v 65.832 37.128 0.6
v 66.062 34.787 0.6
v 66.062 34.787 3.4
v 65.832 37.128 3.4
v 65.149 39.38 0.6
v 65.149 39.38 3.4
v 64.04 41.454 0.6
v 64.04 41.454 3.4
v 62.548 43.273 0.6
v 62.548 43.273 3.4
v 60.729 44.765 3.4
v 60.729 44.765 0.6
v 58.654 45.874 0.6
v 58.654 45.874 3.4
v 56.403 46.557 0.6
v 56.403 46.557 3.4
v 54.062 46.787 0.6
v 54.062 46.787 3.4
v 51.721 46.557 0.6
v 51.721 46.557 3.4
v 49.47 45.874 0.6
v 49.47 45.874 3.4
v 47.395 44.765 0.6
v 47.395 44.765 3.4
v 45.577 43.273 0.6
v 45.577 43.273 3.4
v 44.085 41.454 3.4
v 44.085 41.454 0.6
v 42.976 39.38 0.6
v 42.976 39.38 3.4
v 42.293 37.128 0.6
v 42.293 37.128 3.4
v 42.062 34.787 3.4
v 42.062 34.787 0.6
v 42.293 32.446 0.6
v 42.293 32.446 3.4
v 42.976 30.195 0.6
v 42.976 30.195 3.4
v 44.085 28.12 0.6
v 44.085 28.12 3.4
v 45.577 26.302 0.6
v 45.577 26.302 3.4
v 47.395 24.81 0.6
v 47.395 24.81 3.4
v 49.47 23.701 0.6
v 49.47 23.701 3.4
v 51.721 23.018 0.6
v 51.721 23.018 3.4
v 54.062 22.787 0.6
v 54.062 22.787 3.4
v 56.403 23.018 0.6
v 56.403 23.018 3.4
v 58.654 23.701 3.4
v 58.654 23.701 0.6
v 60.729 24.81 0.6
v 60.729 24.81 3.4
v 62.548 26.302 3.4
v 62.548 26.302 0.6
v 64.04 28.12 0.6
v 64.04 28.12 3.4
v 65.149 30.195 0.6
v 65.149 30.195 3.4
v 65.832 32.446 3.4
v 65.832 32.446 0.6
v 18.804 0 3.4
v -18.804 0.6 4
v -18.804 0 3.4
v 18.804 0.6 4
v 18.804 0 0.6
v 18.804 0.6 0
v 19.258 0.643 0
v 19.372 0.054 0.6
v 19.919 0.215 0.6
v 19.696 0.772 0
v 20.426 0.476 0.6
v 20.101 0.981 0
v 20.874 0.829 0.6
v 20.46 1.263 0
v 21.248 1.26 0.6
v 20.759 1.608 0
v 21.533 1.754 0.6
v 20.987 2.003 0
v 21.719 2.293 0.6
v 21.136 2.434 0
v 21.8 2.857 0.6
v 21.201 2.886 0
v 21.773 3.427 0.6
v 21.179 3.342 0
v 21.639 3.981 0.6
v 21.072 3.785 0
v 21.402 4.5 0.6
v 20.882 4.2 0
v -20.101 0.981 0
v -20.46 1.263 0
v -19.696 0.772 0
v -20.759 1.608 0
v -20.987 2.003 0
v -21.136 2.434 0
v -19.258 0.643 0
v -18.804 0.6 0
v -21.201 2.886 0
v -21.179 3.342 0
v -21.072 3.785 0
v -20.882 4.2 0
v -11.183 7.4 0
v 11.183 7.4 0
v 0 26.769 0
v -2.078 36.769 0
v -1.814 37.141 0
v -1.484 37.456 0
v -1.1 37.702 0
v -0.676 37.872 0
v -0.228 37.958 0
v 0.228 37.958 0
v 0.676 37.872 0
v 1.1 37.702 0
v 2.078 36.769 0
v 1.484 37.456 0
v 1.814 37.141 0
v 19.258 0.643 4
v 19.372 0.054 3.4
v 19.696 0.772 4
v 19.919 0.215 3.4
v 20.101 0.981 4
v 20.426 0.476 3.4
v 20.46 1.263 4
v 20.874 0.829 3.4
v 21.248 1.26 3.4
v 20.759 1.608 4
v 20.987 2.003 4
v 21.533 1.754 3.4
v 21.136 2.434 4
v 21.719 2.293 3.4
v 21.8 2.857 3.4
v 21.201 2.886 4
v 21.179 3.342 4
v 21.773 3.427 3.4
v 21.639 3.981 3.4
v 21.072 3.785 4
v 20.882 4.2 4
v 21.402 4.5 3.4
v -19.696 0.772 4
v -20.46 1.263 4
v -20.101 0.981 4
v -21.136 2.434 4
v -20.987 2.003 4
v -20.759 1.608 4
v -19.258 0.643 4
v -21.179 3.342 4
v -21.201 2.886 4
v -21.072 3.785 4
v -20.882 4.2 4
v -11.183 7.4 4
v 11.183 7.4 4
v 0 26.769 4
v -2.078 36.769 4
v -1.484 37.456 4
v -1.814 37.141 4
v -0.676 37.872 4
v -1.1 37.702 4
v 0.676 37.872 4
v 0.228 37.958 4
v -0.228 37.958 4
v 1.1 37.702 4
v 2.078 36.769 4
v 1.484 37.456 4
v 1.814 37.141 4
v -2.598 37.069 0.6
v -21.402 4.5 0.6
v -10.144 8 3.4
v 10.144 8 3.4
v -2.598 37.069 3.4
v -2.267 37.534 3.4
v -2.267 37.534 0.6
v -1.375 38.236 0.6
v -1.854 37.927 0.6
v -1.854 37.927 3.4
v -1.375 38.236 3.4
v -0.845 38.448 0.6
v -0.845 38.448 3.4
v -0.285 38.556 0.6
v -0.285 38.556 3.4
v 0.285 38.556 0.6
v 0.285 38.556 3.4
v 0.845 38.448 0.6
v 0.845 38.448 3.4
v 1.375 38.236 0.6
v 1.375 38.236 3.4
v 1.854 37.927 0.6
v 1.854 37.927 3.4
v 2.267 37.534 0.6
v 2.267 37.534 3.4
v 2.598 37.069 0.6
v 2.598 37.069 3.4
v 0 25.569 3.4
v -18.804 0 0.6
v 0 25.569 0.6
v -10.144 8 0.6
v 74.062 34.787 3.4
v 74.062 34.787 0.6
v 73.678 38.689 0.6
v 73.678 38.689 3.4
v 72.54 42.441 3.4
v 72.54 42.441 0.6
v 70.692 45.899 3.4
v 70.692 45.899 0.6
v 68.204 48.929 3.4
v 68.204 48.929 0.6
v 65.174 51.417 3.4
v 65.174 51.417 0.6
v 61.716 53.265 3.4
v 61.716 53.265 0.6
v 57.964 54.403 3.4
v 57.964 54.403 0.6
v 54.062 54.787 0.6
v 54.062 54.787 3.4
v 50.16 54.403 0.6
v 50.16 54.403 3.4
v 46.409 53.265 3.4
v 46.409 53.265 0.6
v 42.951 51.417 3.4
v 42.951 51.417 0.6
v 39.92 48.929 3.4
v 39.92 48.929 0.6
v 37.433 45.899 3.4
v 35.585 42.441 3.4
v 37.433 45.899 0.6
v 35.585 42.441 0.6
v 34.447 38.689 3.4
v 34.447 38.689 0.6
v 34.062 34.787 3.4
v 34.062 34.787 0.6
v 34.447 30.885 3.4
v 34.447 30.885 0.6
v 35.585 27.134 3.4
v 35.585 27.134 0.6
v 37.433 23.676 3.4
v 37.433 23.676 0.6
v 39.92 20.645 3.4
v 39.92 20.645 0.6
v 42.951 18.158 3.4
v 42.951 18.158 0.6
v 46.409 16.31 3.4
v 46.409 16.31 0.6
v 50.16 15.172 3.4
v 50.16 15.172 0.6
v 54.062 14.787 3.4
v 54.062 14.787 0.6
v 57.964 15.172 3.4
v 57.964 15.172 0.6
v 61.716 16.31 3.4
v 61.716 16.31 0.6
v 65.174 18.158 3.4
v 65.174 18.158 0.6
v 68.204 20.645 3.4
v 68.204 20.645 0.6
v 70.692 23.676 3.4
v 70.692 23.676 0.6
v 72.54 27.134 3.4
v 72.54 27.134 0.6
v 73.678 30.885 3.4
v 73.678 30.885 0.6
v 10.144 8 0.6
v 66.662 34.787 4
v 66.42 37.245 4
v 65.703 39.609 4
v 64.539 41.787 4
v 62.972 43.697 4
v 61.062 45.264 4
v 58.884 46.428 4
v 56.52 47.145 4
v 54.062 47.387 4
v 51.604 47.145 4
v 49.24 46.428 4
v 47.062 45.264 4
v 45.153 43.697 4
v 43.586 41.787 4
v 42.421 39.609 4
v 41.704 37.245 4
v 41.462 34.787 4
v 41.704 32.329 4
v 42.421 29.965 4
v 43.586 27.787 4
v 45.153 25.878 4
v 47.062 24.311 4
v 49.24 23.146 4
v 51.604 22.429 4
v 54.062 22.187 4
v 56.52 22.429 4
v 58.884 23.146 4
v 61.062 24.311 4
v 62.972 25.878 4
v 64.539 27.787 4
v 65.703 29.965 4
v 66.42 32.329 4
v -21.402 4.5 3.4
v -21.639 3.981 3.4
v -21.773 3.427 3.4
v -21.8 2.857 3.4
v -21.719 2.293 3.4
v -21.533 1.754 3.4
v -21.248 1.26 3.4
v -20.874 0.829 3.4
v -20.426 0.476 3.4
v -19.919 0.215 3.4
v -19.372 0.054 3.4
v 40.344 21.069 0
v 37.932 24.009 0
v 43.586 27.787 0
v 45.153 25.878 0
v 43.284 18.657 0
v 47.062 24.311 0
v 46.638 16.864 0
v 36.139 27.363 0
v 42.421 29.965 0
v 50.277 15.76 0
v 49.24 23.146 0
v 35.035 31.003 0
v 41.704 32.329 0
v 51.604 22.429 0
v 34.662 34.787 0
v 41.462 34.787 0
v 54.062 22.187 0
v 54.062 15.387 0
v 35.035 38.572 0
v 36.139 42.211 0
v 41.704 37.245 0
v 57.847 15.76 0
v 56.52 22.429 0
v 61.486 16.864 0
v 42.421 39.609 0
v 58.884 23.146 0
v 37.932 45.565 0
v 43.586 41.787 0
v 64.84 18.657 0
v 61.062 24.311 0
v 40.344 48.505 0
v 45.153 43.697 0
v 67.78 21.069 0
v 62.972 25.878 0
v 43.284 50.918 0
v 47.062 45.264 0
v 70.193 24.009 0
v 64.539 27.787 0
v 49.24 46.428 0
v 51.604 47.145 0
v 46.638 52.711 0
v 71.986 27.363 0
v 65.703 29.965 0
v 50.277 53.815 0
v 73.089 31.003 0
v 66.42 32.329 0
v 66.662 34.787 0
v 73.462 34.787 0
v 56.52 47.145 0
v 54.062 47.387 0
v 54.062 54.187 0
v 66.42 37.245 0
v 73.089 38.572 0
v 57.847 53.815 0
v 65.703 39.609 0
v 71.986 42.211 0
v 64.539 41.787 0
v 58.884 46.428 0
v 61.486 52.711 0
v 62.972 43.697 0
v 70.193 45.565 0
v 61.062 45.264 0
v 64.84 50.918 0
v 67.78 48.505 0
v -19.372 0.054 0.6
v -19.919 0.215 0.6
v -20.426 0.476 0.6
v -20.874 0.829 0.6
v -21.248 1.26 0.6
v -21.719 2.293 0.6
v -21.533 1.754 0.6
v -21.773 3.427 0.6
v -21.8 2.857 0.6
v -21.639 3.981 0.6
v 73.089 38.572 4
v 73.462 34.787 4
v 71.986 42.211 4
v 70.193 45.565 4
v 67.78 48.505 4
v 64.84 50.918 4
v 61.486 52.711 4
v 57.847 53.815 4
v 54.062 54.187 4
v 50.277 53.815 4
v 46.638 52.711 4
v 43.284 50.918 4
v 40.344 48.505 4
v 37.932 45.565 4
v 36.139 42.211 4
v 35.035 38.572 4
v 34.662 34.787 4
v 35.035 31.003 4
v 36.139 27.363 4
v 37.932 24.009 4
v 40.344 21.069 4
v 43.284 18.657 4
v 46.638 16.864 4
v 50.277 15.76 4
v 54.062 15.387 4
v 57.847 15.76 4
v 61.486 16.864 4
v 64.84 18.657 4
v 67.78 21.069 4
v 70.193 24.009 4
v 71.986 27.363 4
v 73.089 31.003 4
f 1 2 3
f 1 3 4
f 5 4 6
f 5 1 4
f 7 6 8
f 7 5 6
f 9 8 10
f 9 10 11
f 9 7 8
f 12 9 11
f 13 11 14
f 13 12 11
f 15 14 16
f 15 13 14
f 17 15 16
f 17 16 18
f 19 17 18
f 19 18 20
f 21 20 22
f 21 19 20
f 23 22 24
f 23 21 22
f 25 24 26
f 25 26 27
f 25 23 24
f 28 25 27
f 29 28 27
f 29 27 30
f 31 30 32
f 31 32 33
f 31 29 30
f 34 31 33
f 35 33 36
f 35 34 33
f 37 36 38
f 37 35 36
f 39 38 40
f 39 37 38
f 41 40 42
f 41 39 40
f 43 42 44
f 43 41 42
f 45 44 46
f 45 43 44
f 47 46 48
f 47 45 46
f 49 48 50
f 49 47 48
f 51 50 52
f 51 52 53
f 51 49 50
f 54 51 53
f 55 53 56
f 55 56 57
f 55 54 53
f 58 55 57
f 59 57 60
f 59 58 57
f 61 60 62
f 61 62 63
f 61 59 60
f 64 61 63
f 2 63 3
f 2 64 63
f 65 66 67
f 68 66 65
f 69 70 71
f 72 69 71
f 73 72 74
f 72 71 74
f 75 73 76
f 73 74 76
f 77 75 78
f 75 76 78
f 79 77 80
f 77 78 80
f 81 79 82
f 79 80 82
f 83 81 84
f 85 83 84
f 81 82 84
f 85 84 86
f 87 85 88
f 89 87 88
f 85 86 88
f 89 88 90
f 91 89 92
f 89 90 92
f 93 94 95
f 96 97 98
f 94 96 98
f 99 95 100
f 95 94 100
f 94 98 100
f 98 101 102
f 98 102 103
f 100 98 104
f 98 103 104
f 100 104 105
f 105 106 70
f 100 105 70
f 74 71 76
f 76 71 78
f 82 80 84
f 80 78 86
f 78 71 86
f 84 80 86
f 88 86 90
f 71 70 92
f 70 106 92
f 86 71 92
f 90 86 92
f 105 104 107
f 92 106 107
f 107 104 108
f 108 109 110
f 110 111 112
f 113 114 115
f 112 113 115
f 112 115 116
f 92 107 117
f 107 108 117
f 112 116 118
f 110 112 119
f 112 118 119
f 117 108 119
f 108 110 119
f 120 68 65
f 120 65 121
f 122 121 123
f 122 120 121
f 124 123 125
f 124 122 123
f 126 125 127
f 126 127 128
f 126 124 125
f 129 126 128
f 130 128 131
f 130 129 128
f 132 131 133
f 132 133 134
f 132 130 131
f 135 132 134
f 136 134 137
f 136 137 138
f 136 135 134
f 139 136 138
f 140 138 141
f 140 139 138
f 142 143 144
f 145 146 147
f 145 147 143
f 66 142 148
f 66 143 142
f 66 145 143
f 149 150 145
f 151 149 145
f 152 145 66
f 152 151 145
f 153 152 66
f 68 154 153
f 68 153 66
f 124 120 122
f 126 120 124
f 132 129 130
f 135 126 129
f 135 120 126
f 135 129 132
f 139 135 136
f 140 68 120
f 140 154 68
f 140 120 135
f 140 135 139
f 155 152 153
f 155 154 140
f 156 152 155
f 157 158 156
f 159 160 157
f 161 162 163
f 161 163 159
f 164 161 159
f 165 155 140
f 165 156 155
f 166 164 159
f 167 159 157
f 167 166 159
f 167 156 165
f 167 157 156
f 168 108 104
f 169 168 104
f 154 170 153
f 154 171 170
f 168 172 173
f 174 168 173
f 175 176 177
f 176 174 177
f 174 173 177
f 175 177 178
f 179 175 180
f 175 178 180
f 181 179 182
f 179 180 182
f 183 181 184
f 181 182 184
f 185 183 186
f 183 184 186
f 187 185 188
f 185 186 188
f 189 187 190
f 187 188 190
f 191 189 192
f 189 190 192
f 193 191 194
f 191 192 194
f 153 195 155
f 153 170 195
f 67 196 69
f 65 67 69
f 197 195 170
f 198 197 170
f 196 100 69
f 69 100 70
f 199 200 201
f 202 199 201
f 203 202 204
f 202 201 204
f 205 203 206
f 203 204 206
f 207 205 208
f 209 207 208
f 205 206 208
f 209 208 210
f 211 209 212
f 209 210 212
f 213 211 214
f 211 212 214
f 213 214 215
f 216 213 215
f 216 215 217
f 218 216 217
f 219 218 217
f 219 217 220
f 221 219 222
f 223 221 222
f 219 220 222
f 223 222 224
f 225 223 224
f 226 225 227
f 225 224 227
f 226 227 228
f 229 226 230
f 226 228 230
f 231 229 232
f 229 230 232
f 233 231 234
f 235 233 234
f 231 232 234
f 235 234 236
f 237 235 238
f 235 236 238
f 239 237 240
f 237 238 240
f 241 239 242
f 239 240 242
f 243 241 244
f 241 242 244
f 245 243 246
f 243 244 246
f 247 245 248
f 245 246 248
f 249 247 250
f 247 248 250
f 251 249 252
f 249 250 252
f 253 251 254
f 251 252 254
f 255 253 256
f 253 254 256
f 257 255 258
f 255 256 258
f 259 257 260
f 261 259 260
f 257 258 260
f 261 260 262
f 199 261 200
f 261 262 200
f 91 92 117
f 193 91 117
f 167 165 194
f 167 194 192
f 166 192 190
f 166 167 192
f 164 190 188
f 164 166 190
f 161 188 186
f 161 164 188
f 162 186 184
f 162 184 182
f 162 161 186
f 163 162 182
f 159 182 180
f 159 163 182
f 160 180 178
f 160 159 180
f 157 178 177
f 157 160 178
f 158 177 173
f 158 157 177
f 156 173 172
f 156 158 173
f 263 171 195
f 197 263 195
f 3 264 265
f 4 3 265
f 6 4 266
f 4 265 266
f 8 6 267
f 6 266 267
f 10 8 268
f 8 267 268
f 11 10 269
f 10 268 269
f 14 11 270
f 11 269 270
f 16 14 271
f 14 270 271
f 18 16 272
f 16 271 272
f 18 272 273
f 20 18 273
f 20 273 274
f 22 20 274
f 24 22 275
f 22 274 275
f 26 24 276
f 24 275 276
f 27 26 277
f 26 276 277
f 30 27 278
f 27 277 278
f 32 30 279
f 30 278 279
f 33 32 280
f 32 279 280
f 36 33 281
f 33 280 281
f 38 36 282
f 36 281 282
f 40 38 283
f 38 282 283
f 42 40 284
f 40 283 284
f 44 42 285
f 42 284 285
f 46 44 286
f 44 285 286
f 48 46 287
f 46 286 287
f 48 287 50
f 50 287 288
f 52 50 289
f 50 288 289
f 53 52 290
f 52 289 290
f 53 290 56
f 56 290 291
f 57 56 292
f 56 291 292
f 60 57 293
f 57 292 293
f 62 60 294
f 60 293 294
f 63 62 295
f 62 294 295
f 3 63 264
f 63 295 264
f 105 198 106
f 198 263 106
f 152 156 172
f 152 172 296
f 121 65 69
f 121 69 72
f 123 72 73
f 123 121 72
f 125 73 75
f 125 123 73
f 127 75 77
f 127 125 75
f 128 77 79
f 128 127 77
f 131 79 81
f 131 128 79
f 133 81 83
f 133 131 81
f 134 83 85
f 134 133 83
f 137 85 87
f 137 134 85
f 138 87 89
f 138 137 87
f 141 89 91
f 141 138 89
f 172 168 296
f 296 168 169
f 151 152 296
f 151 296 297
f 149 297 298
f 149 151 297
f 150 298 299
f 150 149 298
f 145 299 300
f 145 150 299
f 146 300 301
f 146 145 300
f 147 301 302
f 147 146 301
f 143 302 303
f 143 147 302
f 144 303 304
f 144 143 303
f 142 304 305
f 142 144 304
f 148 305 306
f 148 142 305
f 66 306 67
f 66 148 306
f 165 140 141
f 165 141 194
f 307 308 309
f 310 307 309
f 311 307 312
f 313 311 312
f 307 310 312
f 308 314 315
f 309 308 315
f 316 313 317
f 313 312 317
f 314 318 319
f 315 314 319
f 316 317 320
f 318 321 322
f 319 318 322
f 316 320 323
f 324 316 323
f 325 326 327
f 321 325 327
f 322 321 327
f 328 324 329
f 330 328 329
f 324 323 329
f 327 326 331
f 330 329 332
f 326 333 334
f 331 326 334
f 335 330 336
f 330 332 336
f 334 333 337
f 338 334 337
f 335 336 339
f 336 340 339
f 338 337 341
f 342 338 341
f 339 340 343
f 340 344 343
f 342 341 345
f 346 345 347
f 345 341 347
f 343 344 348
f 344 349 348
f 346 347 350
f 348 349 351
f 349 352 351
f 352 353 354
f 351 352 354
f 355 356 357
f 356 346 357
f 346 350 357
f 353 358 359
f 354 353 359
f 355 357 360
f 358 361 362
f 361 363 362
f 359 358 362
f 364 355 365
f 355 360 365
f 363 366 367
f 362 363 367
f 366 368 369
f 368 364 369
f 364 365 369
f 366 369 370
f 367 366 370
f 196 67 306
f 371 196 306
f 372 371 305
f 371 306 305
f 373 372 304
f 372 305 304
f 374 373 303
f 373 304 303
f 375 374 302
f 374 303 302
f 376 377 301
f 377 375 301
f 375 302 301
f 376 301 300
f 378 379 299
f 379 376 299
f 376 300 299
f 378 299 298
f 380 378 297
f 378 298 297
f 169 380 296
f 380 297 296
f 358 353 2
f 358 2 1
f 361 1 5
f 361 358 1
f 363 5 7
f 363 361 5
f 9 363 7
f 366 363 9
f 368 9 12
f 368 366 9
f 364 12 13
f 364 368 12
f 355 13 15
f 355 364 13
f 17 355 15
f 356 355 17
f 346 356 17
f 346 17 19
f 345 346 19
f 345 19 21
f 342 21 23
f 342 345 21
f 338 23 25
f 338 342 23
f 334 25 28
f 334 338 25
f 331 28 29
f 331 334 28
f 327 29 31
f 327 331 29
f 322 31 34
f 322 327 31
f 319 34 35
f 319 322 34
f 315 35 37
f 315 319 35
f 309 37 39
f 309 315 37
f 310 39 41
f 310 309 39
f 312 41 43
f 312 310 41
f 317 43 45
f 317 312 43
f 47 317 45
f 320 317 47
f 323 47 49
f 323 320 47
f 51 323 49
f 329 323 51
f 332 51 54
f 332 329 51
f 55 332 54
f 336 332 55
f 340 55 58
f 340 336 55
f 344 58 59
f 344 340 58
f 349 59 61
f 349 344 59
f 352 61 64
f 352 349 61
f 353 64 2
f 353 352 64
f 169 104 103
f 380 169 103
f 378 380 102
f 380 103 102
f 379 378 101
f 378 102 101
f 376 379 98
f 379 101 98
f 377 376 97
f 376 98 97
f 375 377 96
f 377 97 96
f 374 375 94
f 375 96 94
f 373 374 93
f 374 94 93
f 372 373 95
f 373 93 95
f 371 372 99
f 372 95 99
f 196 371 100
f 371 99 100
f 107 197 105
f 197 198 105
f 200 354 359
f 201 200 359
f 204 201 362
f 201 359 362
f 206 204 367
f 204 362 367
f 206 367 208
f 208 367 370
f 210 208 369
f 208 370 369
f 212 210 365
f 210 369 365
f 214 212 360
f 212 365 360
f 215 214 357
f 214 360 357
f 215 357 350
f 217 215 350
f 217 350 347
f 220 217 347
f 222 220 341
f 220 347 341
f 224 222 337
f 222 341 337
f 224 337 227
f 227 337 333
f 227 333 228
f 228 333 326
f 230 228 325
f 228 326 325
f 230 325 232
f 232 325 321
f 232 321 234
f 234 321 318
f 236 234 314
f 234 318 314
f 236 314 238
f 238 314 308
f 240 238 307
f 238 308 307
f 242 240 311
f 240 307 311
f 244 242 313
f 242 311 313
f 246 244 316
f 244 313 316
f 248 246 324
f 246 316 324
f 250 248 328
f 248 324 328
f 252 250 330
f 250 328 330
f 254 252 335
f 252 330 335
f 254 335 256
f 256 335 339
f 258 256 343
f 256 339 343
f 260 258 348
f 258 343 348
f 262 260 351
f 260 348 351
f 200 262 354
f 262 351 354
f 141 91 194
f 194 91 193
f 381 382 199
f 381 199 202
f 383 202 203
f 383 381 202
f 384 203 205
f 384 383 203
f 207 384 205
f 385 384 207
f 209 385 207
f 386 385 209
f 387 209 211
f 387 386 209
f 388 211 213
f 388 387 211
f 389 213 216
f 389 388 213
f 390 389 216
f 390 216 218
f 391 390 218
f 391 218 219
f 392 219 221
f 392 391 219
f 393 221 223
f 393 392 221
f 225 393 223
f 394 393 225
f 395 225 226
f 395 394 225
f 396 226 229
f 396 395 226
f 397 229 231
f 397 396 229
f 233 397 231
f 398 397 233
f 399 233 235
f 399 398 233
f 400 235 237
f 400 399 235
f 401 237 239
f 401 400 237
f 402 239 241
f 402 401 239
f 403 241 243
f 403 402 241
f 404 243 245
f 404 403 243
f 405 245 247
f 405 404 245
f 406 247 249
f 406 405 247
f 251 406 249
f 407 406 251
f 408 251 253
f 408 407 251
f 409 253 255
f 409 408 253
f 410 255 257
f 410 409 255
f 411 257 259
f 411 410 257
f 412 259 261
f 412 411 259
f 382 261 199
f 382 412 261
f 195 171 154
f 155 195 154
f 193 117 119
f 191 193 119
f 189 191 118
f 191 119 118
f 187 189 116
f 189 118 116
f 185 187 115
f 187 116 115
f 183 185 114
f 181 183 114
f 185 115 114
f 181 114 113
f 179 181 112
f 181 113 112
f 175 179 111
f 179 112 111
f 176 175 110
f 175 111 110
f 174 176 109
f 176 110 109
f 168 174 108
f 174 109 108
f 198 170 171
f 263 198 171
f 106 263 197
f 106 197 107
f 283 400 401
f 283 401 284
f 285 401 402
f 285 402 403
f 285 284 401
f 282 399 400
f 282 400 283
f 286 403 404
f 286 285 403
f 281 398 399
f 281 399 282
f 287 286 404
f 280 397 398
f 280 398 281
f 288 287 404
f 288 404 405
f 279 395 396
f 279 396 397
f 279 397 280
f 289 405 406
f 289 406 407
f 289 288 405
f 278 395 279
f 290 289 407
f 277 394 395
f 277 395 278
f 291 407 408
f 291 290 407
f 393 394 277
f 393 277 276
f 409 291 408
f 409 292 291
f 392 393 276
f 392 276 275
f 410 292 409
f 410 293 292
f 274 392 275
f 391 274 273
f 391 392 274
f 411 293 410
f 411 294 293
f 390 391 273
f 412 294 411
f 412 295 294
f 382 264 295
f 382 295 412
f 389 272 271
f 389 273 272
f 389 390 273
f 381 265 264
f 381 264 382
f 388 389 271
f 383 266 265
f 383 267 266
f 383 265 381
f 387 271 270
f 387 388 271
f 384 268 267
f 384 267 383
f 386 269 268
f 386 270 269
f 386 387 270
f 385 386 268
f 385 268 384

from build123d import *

# Parameters (mm, degrees)
F1_DEPTH = 4
F3_DEPTH = 25
F4_R     = 3
F5_SIZE  = 0.6
F6_R     = 20
F6_R_2   = 12
F7_DEPTH = 4
F8_SIZE  = 0.6


with BuildPart() as f1:
    # F0 (on Top) → F1 (new body)
    with BuildSketch(Plane.XY):
        Polygon((-24, 0), (0, 0), (24, 0), (0, 41.5692193817), align=None)
    extrude(amount=F1_DEPTH)

    # F2 (on face) → F3 (cut)
    with BuildSketch(Plane.XY.offset(4)):
        Polygon((0, 25.5692193817), (-10.1435935394, 8), (10.1435935394, 8), align=None)
    extrude(amount=-F3_DEPTH, mode=Mode.SUBTRACT)

    # F4
    f4_edges = [f1.edges().sort_by_distance(p)[0] for p in [
        (-24, 0, 2),
        (24, 0, 2),
        (0, 41.569219, 2),
    ]]
    fillet(f4_edges, radius=F4_R)

    # F5
    f5_edges = [f1.edges().sort_by_distance(p)[0] for p in [
        (0, 0, 4),
        (21.401924, 1.5, 4),
        (-21.401924, 1.5, 4),
        (12, 20.78461, 4),
        (-12, 20.78461, 4),
        (0, 38.569219, 4),
        (5.071797, 16.78461, 4),
        (-5.071797, 16.78461, 4),
        (0, 8, 4),
        (0, 0, 0),
        (-21.401924, 1.5, 0),
        (21.401924, 1.5, 0),
        (-12, 20.78461, 0),
        (12, 20.78461, 0),
        (0, 38.569219, 0),
        (5.071797, 16.78461, 0),
        (-5.071797, 16.78461, 0),
        (0, 8, 0),
    ]]
    chamfer(f5_edges, length=F5_SIZE)


with BuildPart() as f7:
    # F6 (on Top) → F7 (new body)
    with BuildSketch(Plane.XY):
        with Locations((54.0622398257, 34.7873009741)):
            Circle(F6_R)
        with Locations((54.0622398257, 34.7873009741)):
            Circle(F6_R_2, mode=Mode.SUBTRACT)
    extrude(amount=F7_DEPTH)

    # F8
    f8_edges = [f7.edges().sort_by_distance(p)[0] for p in [
        (34.06224, 34.787301, 4),
        (42.06224, 34.787301, 4),
        (34.06224, 34.787301, 0),
        (42.06224, 34.787301, 0),
    ]]
    chamfer(f8_edges, length=F8_SIZE)


solid = Compound([f1.part, f7.part])
